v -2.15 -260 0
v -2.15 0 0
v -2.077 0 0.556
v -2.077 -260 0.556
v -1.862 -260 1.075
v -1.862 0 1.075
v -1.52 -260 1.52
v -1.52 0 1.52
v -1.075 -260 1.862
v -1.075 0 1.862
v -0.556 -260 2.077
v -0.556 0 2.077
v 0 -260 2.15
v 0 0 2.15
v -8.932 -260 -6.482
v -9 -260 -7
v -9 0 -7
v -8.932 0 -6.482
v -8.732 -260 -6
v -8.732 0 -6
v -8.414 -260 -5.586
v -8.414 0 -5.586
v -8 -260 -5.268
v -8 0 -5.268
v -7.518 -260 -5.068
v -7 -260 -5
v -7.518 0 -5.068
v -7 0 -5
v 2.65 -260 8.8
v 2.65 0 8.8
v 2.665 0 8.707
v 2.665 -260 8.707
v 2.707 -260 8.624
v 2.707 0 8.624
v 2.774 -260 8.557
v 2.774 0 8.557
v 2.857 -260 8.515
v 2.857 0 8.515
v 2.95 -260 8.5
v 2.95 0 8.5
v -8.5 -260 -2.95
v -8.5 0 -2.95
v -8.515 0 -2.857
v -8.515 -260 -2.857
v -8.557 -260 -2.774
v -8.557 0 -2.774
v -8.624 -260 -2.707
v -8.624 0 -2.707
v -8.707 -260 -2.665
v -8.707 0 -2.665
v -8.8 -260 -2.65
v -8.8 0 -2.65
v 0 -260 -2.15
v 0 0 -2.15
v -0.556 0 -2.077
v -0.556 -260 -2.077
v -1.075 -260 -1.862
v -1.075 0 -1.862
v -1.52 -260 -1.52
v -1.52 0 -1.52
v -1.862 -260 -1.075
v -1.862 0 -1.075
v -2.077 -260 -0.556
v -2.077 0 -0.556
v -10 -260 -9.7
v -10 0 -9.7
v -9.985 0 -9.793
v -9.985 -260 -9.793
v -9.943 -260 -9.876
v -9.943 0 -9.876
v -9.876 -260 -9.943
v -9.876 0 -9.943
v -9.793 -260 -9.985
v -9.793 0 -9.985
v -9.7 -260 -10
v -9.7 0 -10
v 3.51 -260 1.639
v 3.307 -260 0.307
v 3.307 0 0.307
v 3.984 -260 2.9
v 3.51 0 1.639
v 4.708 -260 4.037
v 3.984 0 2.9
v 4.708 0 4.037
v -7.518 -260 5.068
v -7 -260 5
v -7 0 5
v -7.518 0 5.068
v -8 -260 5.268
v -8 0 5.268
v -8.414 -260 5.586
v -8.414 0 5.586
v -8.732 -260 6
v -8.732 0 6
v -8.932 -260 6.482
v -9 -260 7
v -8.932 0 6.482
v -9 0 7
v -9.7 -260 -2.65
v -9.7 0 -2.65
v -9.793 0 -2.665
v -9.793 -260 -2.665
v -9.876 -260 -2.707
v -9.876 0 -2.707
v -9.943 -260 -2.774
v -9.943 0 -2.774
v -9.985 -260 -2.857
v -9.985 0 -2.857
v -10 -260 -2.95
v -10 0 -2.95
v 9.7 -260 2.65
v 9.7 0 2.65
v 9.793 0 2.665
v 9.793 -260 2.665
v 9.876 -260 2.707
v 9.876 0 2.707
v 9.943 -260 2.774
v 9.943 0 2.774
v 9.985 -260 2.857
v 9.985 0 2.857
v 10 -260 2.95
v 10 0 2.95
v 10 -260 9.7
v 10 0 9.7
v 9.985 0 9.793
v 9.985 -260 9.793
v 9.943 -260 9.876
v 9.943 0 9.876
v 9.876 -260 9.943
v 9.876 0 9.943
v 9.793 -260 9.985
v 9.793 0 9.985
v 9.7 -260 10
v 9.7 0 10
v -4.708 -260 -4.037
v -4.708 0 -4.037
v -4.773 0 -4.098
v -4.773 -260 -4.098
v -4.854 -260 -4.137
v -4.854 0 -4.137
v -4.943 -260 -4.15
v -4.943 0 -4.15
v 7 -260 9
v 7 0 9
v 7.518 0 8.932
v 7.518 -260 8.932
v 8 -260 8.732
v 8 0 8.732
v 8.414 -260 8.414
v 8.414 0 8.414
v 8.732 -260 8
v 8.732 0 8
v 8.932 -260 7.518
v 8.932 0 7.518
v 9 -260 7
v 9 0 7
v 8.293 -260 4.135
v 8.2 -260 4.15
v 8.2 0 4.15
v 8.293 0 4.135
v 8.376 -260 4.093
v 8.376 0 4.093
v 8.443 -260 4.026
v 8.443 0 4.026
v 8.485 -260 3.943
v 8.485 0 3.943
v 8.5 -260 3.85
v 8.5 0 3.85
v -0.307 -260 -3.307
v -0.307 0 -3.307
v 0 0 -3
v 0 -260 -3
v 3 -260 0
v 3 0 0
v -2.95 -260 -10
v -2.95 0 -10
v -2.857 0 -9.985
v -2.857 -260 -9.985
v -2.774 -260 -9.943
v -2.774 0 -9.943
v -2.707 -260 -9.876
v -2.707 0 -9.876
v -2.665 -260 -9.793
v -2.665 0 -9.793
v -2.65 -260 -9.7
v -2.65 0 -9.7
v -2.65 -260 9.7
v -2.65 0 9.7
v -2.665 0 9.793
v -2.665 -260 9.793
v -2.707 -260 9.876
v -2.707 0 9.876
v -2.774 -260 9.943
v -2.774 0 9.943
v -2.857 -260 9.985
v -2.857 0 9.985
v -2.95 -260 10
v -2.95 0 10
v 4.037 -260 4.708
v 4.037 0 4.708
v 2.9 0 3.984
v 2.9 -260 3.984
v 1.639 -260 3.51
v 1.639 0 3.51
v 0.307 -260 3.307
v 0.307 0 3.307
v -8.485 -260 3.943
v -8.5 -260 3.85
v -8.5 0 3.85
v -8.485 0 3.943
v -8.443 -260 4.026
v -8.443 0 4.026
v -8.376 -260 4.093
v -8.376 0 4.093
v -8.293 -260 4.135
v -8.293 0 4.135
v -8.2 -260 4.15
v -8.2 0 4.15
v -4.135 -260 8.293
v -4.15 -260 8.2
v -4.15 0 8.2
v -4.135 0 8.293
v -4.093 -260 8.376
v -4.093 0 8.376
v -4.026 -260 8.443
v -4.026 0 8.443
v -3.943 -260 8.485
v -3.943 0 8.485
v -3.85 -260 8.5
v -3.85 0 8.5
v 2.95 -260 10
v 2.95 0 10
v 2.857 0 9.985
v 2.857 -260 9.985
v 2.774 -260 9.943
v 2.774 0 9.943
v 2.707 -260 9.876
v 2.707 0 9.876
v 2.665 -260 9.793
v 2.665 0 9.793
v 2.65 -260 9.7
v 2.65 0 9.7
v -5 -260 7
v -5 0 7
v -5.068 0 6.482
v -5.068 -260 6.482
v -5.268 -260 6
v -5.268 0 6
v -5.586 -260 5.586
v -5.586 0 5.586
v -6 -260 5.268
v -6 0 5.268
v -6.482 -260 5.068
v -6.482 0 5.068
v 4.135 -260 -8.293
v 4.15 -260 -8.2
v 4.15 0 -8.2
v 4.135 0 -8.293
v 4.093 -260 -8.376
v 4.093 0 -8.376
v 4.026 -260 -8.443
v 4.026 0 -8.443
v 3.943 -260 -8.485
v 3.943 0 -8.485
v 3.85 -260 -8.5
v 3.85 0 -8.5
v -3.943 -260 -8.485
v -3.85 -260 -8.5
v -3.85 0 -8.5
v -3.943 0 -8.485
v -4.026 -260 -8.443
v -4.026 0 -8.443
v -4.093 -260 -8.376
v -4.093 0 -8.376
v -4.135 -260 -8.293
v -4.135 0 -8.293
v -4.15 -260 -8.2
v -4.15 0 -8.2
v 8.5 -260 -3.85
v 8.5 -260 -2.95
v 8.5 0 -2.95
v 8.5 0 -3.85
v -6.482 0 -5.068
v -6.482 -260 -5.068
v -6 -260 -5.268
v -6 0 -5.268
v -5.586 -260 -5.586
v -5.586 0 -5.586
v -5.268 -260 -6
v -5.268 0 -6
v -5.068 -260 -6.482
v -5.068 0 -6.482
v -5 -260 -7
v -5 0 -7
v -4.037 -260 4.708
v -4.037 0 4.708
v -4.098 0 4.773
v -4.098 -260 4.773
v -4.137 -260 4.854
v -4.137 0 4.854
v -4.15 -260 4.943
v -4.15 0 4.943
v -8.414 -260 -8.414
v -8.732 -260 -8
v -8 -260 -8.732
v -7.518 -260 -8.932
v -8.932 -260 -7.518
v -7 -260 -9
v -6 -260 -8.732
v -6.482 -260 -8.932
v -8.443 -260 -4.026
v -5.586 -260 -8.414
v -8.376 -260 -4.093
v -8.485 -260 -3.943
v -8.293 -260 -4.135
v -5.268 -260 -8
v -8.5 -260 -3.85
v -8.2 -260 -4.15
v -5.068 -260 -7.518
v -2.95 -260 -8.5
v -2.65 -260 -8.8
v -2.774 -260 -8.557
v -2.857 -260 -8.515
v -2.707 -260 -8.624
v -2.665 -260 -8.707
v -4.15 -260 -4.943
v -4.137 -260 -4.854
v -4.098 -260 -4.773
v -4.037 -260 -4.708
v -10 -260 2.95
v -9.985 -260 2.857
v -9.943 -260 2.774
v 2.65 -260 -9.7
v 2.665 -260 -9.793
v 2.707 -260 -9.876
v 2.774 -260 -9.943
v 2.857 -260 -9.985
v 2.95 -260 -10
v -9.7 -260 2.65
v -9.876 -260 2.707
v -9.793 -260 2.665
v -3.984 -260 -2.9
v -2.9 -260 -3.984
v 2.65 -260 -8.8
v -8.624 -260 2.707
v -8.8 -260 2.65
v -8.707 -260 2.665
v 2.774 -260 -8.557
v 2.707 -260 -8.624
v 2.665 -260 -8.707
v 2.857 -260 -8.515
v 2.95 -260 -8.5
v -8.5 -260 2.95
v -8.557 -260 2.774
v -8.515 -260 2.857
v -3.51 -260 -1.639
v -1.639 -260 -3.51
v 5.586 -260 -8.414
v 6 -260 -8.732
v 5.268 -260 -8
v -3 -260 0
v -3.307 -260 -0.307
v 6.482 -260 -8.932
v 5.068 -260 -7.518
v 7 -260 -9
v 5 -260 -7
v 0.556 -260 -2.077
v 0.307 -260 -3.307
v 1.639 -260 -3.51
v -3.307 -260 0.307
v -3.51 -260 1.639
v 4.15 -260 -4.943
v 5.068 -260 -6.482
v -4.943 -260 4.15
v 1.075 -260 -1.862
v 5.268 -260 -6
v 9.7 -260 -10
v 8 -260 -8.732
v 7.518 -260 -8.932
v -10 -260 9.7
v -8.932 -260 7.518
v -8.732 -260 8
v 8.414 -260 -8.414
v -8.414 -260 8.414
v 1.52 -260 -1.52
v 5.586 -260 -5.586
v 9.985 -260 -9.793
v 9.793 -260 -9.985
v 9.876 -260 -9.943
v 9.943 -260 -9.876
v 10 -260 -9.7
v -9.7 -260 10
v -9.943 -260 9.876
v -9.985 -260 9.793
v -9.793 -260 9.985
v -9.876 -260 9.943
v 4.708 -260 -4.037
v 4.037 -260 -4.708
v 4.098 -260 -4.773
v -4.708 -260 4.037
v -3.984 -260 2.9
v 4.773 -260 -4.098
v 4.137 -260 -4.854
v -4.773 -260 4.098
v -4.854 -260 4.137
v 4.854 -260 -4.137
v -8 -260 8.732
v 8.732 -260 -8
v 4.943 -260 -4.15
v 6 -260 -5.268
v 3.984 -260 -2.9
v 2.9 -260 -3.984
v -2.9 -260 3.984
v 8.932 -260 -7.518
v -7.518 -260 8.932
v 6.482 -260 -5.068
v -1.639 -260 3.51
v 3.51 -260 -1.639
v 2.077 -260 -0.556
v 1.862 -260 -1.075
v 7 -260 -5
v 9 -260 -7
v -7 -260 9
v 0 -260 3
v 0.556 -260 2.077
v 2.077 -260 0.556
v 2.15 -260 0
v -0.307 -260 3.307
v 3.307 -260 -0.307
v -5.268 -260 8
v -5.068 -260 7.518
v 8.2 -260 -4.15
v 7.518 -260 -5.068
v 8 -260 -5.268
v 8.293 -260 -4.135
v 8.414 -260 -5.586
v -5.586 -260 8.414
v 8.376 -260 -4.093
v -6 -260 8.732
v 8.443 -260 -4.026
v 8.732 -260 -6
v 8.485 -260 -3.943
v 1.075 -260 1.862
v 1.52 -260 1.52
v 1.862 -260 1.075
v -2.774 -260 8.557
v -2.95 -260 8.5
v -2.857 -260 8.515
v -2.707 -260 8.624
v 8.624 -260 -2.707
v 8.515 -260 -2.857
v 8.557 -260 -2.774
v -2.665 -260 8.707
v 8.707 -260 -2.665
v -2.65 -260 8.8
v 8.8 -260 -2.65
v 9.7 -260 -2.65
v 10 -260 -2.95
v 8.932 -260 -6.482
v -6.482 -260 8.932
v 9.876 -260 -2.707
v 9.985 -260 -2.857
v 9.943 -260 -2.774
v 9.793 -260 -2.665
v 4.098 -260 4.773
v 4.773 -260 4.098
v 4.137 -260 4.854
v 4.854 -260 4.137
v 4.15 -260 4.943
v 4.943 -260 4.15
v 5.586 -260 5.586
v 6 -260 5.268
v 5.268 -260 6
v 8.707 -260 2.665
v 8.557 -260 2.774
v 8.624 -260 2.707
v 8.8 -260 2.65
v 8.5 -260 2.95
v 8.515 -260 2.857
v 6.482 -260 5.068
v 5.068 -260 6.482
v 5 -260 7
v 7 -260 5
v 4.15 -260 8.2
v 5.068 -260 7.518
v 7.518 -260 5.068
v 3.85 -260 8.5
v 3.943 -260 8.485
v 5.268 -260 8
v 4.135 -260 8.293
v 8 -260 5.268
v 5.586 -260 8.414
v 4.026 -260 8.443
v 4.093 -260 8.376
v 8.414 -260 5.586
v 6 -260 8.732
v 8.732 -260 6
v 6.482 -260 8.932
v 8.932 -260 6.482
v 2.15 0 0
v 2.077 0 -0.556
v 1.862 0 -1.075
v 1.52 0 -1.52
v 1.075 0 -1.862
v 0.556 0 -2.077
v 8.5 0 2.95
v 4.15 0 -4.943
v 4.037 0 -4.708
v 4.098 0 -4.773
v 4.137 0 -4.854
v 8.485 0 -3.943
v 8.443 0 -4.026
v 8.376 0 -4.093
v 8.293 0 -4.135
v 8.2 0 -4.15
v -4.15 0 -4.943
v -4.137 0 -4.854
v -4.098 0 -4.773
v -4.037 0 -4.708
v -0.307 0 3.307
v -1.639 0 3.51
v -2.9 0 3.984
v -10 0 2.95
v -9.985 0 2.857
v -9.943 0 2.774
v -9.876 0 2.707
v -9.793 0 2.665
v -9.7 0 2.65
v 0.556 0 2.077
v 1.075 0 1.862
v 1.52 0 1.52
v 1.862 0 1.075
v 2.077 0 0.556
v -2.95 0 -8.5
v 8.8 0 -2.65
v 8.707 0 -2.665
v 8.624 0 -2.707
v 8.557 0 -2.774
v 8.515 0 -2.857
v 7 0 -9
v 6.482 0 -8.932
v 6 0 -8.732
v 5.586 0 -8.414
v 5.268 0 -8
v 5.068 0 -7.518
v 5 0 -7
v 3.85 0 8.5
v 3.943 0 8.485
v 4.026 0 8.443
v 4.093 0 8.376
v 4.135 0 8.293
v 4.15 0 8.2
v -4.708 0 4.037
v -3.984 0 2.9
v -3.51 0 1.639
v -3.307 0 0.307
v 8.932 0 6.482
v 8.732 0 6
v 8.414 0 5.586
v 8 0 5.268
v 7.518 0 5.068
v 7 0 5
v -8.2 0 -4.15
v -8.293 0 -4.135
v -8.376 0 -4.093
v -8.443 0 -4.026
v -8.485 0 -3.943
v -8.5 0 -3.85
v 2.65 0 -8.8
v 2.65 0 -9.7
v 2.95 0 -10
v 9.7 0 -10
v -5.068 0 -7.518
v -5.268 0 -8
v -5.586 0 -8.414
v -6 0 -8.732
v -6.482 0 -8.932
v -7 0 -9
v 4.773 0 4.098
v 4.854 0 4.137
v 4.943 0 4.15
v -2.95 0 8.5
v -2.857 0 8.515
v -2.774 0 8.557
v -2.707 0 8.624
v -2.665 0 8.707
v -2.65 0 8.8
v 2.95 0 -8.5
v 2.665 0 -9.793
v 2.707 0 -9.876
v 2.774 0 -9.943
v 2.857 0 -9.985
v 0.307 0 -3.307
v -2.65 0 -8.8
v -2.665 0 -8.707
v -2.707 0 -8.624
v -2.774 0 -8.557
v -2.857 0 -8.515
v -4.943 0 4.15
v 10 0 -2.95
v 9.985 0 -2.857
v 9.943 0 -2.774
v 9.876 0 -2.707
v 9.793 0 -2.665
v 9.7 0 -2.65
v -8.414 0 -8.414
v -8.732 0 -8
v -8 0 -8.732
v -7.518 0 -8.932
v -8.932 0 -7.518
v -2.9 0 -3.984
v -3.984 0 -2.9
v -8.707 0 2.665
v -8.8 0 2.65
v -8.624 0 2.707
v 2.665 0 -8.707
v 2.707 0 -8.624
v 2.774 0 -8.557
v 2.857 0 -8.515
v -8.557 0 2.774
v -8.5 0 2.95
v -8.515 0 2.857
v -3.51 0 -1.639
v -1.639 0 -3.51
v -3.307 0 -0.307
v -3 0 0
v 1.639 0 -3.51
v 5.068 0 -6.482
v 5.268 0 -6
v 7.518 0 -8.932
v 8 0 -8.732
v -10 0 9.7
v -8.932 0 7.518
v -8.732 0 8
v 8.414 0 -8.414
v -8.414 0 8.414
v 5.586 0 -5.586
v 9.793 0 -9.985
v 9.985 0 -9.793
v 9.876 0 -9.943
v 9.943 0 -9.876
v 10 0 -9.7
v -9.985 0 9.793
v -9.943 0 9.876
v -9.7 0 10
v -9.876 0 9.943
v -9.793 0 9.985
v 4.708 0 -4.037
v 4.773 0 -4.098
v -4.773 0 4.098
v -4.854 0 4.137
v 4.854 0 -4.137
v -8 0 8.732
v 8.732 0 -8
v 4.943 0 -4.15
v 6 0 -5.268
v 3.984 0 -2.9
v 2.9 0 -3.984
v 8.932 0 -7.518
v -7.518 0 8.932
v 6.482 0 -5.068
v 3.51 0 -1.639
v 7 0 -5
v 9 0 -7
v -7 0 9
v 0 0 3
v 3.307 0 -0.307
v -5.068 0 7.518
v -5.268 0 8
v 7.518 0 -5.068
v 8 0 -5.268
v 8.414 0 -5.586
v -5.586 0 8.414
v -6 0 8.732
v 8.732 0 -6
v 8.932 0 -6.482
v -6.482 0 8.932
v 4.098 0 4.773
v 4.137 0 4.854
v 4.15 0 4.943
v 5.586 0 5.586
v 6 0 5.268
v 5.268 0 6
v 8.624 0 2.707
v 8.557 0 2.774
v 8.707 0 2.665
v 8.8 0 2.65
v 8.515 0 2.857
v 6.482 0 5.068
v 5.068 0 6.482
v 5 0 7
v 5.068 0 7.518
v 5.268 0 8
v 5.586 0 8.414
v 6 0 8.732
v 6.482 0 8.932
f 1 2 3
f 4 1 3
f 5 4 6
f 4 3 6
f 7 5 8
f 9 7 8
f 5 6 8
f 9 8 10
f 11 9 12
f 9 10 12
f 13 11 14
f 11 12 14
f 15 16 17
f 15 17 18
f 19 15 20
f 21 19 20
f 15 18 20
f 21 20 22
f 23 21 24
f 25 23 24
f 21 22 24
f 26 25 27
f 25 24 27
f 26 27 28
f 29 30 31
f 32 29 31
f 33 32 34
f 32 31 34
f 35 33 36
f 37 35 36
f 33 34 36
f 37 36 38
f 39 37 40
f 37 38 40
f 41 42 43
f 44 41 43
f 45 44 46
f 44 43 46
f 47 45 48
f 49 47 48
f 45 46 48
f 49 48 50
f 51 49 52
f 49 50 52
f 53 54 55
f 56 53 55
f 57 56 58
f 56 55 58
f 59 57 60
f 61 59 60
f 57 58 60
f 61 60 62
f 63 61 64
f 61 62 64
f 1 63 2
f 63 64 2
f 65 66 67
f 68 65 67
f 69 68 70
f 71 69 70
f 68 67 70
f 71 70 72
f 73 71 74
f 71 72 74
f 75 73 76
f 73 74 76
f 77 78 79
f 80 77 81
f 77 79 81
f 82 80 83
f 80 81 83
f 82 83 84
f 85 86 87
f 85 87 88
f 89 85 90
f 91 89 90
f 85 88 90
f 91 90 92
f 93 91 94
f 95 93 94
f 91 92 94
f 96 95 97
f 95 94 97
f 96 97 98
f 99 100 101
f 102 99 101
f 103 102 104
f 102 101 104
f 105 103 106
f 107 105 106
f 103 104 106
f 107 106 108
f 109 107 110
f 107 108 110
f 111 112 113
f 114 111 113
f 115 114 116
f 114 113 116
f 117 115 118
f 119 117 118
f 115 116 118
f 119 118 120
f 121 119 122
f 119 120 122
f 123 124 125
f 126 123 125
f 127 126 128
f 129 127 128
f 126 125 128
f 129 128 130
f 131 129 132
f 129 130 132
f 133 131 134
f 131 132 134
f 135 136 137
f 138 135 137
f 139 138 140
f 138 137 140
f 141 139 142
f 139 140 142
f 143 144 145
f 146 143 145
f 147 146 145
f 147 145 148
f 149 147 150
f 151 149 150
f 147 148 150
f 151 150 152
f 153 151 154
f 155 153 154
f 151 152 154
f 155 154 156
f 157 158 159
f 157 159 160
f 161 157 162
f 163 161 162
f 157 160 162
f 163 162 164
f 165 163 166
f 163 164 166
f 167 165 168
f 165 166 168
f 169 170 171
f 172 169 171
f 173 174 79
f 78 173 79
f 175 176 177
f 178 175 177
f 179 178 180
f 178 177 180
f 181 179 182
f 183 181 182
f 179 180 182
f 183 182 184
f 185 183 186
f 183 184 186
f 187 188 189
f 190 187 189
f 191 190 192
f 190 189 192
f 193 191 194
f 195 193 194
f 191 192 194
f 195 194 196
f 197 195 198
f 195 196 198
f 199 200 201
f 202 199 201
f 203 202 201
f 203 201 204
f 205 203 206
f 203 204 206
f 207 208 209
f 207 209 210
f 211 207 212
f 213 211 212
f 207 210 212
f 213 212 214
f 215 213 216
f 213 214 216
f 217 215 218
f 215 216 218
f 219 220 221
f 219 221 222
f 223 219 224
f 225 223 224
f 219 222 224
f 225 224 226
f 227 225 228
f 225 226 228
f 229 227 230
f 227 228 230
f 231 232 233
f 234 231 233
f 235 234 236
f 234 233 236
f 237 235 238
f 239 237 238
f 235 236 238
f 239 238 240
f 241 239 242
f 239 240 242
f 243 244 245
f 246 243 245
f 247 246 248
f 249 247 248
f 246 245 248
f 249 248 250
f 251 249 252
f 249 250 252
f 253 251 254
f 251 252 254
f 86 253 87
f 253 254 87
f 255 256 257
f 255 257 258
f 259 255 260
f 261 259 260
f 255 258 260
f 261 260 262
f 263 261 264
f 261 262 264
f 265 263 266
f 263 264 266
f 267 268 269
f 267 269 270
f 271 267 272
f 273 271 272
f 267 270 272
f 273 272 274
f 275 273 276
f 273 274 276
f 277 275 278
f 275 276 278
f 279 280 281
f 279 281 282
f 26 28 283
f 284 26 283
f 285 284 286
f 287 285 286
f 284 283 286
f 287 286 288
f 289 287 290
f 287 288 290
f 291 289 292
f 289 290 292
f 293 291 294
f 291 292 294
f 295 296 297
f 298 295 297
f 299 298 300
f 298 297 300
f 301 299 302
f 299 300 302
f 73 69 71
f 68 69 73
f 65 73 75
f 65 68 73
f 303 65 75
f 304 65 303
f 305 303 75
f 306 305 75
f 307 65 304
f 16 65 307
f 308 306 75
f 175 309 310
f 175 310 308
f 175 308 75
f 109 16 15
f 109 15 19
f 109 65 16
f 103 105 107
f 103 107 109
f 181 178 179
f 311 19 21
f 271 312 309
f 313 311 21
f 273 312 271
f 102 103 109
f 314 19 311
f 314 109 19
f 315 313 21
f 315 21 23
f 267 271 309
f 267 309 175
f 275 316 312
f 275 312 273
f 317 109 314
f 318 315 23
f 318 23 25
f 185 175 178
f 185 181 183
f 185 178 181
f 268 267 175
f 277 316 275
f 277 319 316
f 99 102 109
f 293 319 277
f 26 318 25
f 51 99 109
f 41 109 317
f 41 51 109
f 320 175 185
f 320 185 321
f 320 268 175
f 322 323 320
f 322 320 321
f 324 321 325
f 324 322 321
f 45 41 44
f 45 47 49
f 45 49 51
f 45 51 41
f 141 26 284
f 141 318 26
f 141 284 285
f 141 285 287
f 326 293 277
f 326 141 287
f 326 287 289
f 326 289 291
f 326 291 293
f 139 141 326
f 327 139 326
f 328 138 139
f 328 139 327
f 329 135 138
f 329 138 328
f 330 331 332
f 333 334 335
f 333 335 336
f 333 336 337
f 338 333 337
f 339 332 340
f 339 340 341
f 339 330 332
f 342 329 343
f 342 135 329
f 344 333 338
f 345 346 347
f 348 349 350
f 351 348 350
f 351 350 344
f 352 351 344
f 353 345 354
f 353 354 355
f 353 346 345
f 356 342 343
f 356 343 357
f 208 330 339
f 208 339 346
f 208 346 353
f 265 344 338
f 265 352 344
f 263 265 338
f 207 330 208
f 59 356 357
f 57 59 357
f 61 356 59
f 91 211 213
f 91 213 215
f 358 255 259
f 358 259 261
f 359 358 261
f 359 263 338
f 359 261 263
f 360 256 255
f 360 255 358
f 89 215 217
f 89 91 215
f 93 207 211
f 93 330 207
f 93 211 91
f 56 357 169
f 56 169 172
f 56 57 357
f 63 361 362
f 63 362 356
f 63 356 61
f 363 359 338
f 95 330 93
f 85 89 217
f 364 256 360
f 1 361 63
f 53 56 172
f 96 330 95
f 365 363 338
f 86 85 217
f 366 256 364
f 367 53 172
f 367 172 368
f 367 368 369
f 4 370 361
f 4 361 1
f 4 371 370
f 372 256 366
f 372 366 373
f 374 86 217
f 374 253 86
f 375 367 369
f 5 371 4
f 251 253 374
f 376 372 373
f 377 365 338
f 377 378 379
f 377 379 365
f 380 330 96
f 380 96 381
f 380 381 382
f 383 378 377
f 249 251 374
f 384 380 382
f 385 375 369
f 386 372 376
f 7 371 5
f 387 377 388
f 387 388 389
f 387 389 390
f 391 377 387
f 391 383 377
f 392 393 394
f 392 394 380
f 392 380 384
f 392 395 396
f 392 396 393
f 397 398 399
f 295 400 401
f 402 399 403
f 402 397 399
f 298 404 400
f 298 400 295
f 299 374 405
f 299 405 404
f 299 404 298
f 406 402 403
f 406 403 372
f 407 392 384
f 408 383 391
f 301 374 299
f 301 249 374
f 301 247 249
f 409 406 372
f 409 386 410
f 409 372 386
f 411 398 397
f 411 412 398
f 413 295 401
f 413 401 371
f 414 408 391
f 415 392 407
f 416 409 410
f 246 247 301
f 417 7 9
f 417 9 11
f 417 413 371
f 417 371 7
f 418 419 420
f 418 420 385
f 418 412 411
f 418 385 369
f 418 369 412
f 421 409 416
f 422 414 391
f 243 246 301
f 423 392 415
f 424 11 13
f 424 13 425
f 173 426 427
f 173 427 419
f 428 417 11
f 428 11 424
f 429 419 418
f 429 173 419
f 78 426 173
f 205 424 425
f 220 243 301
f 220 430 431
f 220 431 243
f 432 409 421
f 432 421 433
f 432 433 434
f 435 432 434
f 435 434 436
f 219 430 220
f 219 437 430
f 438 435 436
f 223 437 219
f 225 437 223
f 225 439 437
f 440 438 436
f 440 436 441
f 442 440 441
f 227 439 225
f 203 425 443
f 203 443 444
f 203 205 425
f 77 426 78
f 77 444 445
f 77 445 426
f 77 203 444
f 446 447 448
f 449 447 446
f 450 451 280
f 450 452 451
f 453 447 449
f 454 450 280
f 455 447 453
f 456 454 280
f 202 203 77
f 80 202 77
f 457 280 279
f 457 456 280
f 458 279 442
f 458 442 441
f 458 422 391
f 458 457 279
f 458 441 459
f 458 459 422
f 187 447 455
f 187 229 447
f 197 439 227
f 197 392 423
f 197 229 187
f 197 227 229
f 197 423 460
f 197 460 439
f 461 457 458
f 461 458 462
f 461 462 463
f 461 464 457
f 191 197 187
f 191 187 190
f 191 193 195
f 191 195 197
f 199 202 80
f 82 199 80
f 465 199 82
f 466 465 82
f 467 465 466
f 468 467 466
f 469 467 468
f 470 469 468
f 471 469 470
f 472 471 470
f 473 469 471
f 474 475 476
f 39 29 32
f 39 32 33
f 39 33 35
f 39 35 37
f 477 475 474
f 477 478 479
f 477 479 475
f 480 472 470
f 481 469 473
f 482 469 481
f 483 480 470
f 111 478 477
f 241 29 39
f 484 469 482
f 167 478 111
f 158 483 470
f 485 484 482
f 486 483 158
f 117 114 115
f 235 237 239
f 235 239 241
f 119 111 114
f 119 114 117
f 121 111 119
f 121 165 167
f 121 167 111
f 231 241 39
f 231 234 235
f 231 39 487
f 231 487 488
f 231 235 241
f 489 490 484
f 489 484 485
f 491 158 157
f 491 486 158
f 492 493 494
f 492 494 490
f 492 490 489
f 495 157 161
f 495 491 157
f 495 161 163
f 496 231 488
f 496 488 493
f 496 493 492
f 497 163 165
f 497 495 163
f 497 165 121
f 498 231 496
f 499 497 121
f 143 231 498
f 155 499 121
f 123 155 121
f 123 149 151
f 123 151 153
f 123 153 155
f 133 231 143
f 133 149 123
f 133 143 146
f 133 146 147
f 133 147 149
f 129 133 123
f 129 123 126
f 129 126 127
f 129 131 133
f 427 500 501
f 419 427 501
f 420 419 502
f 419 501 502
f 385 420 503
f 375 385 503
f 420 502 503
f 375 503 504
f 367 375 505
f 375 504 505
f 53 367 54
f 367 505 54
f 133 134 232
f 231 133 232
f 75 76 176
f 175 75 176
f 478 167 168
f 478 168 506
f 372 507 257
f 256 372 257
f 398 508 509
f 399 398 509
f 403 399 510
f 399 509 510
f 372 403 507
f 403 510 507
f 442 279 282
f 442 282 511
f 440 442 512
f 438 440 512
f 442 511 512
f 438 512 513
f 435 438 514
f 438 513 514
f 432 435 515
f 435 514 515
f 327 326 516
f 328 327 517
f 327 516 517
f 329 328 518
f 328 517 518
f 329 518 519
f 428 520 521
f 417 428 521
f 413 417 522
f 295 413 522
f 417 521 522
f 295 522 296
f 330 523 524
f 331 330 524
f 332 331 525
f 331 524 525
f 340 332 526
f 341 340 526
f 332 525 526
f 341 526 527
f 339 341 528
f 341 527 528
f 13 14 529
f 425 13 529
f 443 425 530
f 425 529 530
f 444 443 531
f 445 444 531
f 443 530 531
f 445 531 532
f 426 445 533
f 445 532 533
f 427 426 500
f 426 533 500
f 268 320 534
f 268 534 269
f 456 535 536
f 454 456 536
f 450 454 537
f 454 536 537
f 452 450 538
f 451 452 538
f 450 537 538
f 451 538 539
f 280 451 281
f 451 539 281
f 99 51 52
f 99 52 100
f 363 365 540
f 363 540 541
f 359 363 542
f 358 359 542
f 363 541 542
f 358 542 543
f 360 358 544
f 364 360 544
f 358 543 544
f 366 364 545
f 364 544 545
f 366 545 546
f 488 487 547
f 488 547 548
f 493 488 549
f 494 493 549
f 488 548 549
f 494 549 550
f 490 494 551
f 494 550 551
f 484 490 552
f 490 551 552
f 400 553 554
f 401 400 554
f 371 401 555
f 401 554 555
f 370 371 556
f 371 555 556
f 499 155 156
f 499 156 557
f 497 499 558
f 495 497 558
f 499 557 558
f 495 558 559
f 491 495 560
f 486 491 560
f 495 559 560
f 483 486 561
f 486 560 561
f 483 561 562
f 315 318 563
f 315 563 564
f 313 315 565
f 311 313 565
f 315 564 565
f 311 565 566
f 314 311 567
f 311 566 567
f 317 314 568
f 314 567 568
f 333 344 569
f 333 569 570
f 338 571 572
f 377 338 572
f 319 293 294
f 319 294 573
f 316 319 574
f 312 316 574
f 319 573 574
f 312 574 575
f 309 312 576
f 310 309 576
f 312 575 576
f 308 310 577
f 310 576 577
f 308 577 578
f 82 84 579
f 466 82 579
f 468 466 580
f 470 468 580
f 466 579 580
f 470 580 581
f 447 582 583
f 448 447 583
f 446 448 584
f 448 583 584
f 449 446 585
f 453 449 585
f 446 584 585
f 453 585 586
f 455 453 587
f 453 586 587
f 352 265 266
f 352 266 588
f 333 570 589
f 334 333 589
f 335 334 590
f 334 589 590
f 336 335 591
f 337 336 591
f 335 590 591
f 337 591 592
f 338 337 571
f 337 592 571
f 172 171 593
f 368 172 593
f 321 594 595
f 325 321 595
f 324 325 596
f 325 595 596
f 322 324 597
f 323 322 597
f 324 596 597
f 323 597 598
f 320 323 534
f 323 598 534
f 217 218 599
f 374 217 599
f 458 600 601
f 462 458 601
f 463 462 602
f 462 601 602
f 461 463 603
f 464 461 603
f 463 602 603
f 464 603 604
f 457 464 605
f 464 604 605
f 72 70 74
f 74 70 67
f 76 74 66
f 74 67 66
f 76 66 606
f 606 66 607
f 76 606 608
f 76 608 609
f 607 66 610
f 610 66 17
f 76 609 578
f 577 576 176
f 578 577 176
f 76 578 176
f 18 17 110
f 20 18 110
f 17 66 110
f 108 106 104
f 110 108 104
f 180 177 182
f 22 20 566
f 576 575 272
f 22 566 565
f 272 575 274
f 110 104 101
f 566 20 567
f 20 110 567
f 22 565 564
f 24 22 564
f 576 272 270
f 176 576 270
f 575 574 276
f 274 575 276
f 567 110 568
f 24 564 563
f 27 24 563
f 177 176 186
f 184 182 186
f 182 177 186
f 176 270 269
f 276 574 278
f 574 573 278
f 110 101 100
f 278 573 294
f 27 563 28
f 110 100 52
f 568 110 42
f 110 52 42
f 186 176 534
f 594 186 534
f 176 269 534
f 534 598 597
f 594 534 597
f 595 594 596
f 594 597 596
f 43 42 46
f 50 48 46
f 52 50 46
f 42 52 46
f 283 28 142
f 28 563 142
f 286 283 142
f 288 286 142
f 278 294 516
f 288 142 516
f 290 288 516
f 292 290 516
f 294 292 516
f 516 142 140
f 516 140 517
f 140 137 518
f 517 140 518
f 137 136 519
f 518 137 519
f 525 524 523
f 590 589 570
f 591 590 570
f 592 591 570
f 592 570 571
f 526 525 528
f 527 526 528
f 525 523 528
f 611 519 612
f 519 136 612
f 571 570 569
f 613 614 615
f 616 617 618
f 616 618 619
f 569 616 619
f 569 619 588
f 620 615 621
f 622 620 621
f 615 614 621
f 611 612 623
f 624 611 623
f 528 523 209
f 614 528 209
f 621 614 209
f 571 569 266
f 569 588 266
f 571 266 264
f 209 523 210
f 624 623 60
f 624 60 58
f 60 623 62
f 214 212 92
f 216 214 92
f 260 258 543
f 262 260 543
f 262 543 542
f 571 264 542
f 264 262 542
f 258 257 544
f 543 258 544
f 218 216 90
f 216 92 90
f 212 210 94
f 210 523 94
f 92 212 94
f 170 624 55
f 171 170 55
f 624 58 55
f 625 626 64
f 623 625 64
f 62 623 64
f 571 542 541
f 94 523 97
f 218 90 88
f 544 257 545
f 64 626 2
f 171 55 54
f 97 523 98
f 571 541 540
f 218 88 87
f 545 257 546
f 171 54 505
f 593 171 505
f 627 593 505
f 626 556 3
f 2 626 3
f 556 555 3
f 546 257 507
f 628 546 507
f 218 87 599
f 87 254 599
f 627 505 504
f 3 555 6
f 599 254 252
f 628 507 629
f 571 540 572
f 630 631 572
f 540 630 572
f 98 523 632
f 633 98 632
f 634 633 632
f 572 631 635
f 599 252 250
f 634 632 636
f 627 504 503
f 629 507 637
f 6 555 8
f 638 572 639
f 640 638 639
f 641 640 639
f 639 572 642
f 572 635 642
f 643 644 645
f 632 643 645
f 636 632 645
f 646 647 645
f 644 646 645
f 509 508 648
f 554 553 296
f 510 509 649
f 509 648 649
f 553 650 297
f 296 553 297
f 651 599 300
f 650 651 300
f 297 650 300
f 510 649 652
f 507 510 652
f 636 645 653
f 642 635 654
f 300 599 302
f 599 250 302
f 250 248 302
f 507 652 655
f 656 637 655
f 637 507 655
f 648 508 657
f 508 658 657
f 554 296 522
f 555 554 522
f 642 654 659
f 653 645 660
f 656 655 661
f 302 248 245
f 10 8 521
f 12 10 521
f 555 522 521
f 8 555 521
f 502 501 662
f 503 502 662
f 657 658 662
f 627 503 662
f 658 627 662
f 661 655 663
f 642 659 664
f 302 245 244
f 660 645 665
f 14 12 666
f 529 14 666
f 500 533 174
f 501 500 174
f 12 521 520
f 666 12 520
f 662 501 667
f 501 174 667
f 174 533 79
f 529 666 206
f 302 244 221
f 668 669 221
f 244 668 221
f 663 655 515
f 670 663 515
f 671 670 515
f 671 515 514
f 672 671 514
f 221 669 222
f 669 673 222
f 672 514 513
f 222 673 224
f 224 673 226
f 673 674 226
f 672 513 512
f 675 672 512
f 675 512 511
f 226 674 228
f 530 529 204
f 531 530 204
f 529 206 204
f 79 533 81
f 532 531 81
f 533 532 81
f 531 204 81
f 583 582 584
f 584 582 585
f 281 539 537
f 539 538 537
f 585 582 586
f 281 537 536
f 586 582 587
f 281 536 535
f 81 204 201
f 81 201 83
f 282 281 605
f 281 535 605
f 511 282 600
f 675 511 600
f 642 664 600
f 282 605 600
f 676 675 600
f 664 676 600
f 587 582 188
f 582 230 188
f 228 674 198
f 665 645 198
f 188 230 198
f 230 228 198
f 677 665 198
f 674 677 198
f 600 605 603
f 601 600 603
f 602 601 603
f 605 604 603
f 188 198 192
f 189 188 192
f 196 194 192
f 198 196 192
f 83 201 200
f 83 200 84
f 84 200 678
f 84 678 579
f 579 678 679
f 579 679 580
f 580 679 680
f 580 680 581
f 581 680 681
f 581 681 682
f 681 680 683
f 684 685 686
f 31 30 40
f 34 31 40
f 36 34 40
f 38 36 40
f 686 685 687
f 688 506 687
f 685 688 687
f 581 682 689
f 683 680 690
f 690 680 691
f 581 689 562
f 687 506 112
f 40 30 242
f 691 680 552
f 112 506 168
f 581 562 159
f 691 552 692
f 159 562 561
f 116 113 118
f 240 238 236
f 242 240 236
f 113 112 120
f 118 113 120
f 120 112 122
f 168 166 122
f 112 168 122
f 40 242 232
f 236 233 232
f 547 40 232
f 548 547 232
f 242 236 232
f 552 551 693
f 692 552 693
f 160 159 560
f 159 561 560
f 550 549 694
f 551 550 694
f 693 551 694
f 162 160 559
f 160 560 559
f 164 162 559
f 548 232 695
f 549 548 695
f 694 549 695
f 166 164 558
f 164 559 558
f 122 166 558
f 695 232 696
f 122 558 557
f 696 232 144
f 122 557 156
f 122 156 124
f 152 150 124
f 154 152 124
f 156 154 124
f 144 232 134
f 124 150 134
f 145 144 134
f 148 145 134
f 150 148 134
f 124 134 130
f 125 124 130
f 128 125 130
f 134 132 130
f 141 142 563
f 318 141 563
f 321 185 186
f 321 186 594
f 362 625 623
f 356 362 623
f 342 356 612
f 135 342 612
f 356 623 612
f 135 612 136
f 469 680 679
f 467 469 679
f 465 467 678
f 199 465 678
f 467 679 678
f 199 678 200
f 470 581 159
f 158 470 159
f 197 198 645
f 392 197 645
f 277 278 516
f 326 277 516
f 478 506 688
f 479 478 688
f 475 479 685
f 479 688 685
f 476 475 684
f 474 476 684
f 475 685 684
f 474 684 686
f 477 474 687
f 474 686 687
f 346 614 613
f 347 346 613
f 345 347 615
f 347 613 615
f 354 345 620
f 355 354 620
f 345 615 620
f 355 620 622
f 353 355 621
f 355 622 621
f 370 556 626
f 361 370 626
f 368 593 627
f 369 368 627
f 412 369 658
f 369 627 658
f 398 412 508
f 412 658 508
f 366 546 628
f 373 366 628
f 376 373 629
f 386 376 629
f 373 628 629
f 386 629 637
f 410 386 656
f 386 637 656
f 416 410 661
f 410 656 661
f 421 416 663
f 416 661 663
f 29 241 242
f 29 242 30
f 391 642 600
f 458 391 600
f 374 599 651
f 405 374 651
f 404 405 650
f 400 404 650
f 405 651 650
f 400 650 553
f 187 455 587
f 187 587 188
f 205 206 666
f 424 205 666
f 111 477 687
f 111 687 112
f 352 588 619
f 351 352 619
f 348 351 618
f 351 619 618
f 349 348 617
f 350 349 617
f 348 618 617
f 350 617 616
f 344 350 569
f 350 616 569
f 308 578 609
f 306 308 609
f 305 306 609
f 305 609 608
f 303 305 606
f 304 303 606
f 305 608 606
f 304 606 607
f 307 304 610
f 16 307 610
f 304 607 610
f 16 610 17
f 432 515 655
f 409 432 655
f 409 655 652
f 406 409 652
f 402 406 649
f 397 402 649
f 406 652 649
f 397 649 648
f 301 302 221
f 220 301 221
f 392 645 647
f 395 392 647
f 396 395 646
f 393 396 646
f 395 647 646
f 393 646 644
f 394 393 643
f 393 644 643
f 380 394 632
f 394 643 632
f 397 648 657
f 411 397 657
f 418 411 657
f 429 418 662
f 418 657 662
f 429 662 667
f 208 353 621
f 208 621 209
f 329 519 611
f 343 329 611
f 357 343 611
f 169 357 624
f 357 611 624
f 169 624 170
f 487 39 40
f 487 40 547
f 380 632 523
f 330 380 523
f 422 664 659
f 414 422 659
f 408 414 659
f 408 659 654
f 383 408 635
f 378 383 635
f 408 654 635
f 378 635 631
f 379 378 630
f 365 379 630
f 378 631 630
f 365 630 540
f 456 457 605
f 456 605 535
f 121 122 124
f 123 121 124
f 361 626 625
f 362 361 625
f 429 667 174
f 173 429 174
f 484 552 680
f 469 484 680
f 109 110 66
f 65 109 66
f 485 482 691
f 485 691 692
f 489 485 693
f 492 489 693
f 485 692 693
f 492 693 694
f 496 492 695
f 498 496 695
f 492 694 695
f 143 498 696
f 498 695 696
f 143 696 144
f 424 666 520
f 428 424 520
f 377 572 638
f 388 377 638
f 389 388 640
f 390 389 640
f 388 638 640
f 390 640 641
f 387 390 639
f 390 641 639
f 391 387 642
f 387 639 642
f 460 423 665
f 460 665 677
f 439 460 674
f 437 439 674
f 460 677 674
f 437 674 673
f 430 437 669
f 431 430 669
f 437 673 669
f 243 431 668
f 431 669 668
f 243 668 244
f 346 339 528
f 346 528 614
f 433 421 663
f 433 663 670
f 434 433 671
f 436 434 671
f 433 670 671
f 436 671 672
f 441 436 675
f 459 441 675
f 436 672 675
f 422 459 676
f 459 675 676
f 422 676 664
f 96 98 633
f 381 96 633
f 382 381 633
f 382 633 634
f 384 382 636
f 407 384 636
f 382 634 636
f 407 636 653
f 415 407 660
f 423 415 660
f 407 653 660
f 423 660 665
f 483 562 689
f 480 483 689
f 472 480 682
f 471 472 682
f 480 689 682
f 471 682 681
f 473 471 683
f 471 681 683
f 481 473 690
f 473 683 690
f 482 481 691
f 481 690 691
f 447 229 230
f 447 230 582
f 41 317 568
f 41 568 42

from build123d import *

# Parameters (mm, degrees)
F1_DEPTH = 260


# Not quite as in the source:
# - ends of sketch curves that miss each other by under 0.0002 mm in the source are joined


with BuildPart() as f1:
    # F0 (on Front) → F1 (new body)
    with BuildSketch(Plane.XZ):
        with BuildLine():
            ThreePointArc((-2.15, 0), (-1.5202795796, 1.5202795796), (0, 2.15))
            Line((0, 2.15), (0, 3))
            Line((0, 3), (-0.307277, 3.307278))
            ThreePointArc((-0.307277, 3.307278), (-2.2820211583, 3.7143800615), (-4.036565823, 4.7078182229))
            ThreePointArc((-4.036565823, 4.7078182229), (-4.1201572004, 4.8123081084), (-4.15, 4.94275))
            Line((-4.15, 4.94275), (-4.15, 8.2))
            ThreePointArc((-4.15, 8.2), (-4.0621320344, 8.4121320344), (-3.85, 8.5))
            Line((-3.85, 8.5), (-2.95, 8.5))
            ThreePointArc((-2.95, 8.5), (-2.7378679656, 8.5878679656), (-2.65, 8.8))
            Line((-2.65, 8.8), (-2.65, 9.7))
            ThreePointArc((-2.65, 9.7), (-2.7378679656, 9.9121320344), (-2.95, 10))
            Line((-2.95, 10), (-9.7, 10))
            ThreePointArc((-9.7, 10), (-9.9121320344, 9.9121320344), (-10, 9.7))
            Line((-10, 9.7), (-10, 2.95))
            ThreePointArc((-10, 2.95), (-9.9121320344, 2.7378679656), (-9.7, 2.65))
            Line((-9.7, 2.65), (-8.8, 2.65))
            ThreePointArc((-8.8, 2.65), (-8.5878679656, 2.7378679656), (-8.5, 2.95))
            Line((-8.5, 2.95), (-8.5, 3.85))
            ThreePointArc((-8.5, 3.85), (-8.4121320344, 4.0621320344), (-8.2, 4.15))
            Line((-8.2, 4.15), (-4.942749, 4.15))
            ThreePointArc((-4.942749, 4.15), (-4.812307461, 4.1201573706), (-4.7078173786, 4.0365666993))
            ThreePointArc((-4.7078173786, 4.0365666993), (-3.7143793747, 2.2820219924), (-3.3072773955, 0.3072779813))
            Line((-3.3072773955, 0.3072779813), (-3, 0))
            Line((-3, 0), (-2.15, 0))
        make_face()
        with BuildLine():
            ThreePointArc((-7, 5), (-8.4142135624, 5.5857864376), (-9, 7))
            ThreePointArc((-9, 7), (-8.4142135624, 8.4142135624), (-7, 9))
            ThreePointArc((-7, 9), (-5.5857864376, 8.4142135624), (-5, 7))
            ThreePointArc((-5, 7), (-5.5857864376, 5.5857864376), (-7, 5))
        make_face(mode=Mode.SUBTRACT)
        with BuildLine():
            ThreePointArc((0, 2.15), (1.5202795796, 1.5202795796), (2.15, 0))
            Line((2.15, 0), (3, 0))
            Line((3, 0), (3.307278, 0.307278))
            ThreePointArc((3.307278, 0.307278), (3.7143803747, 2.2820219924), (4.7078187099, 4.0365664363))
            ThreePointArc((4.7078187099, 4.0365664363), (4.812308461, 4.1201573706), (4.94275, 4.15))
            Line((4.94275, 4.15), (8.2, 4.15))
            ThreePointArc((8.2, 4.15), (8.4121320344, 4.0621320344), (8.5, 3.85))
            Line((8.5, 3.85), (8.5, 2.95))
            ThreePointArc((8.5, 2.95), (8.5878679656, 2.7378679656), (8.8, 2.65))
            Line((8.8, 2.65), (9.7, 2.65))
            ThreePointArc((9.7, 2.65), (9.9121320344, 2.7378679656), (10, 2.95))
            Line((10, 2.95), (10, 9.7))
            ThreePointArc((10, 9.7), (9.9121320344, 9.9121320344), (9.7, 10))
            Line((9.7, 10), (2.95, 10))
            ThreePointArc((2.95, 10), (2.7378679656, 9.9121320344), (2.65, 9.7))
            Line((2.65, 9.7), (2.65, 8.8))
            ThreePointArc((2.65, 8.8), (2.7378679656, 8.5878679656), (2.95, 8.5))
            Line((2.95, 8.5), (3.85, 8.5))
            ThreePointArc((3.85, 8.5), (4.0621320344, 8.4121320344), (4.15, 8.2))
            Line((4.15, 8.2), (4.15, 4.94275))
            ThreePointArc((4.15, 4.94275), (4.1201572004, 4.8123081084), (4.036566086, 4.7078178916))
            ThreePointArc((4.036566086, 4.7078178916), (2.2820216259, 3.7143802371), (0.3072779813, 3.3072783955))
            Line((0.3072779813, 3.3072783955), (0, 3))
            Line((0, 3), (0, 2.15))
        make_face()
        with BuildLine():
            ThreePointArc((7, 9), (8.4142135624, 8.4142135624), (9, 7))
            ThreePointArc((9, 7), (8.4142135624, 5.5857864376), (7, 5))
            ThreePointArc((7, 5), (5.5857864376, 5.5857864376), (5, 7))
            ThreePointArc((5, 7), (5.5857864376, 8.4142135624), (7, 9))
        make_face(mode=Mode.SUBTRACT)
        with BuildLine():
            Line((3, 0), (2.15, 0))
            ThreePointArc((2.15, 0), (1.5202795796, -1.5202795796), (0, -2.15))
            Line((0, -2.15), (0, -3))
            Line((0, -3), (0.307278, -3.307277))
            ThreePointArc((0.307278, -3.307277), (2.2820216259, -3.7143792371), (4.036565823, -4.7078172229))
            ThreePointArc((4.036565823, -4.7078172229), (4.1201572004, -4.8123071084), (4.15, -4.942749))
            Line((4.15, -4.942749), (4.15, -8.2))
            ThreePointArc((4.15, -8.2), (4.0621320344, -8.4121320344), (3.85, -8.5))
            Line((3.85, -8.5), (2.95, -8.5))
            ThreePointArc((2.95, -8.5), (2.7378679656, -8.5878679656), (2.65, -8.8))
            Line((2.65, -8.8), (2.65, -9.7))
            ThreePointArc((2.65, -9.7), (2.7378679656, -9.9121320344), (2.95, -10))
            Line((2.95, -10), (9.7, -10))
            ThreePointArc((9.7, -10), (9.9121320344, -9.9121320344), (10, -9.7))
            Line((10, -9.7), (10, -2.95))
            ThreePointArc((10, -2.95), (9.9121320344, -2.7378679656), (9.7, -2.65))
            Line((9.7, -2.65), (8.8, -2.65))
            ThreePointArc((8.8, -2.65), (8.5878679656, -2.7378679656), (8.5, -2.95))
            Line((8.5, -2.95), (8.5, -3.85))
            ThreePointArc((8.5, -3.85), (8.4121320344, -4.0621320344), (8.2, -4.15))
            Line((8.2, -4.15), (4.94275, -4.15))
            ThreePointArc((4.94275, -4.15), (4.8123081084, -4.1201572004), (4.7078178916, -4.036566086))
            ThreePointArc((4.7078178916, -4.036566086), (3.7143800615, -2.2820211583), (3.3072783483, -0.3072769835))
            Line((3.3072783483, -0.3072769835), (3, 0))
        make_face()
        with BuildLine():
            ThreePointArc((7, -5), (8.4142135624, -5.5857864376), (9, -7))
            ThreePointArc((9, -7), (8.4142135624, -8.4142135624), (7, -9))
            ThreePointArc((7, -9), (5.5857864376, -8.4142135624), (5, -7))
            ThreePointArc((5, -7), (5.5857864376, -5.5857864376), (7, -5))
        make_face(mode=Mode.SUBTRACT)
        with BuildLine():
            Line((0, -3), (0, -2.15))
            ThreePointArc((0, -2.15), (-1.5202795796, -1.5202795796), (-2.15, 0))
            Line((-2.15, 0), (-3, 0))
            Line((-3, 0), (-3.307277, -0.307277))
            ThreePointArc((-3.307277, -0.307277), (-3.7143790615, -2.2820211583), (-4.7078172229, -4.036565823))
            ThreePointArc((-4.7078172229, -4.036565823), (-4.8123071084, -4.1201572004), (-4.942749, -4.15))
            Line((-4.942749, -4.15), (-8.2, -4.15))
            ThreePointArc((-8.2, -4.15), (-8.4121320344, -4.0621320344), (-8.5, -3.85))
            Line((-8.5, -3.85), (-8.5, -2.95))
            ThreePointArc((-8.5, -2.95), (-8.5878679656, -2.7378679656), (-8.8, -2.65))
            Line((-8.8, -2.65), (-9.7, -2.65))
            ThreePointArc((-9.7, -2.65), (-9.9121320344, -2.7378679656), (-10, -2.95))
            Line((-10, -2.95), (-10, -9.7))
            ThreePointArc((-10, -9.7), (-9.9121320344, -9.9121320344), (-9.7, -10))
            Line((-9.7, -10), (-2.95, -10))
            ThreePointArc((-2.95, -10), (-2.7378679656, -9.9121320344), (-2.65, -9.7))
            Line((-2.65, -9.7), (-2.65, -8.8))
            ThreePointArc((-2.65, -8.8), (-2.7378679656, -8.5878679656), (-2.95, -8.5))
            Line((-2.95, -8.5), (-3.85, -8.5))
            ThreePointArc((-3.85, -8.5), (-4.0621320344, -8.4121320344), (-4.15, -8.2))
            Line((-4.15, -8.2), (-4.15, -4.942749))
            ThreePointArc((-4.15, -4.942749), (-4.1201572004, -4.8123071084), (-4.036566086, -4.7078168916))
            ThreePointArc((-4.036566086, -4.7078168916), (-2.2820211583, -3.7143790615), (-0.3072769835, -3.3072773483))
            Line((-0.3072769835, -3.3072773483), (0, -3))
        make_face()
        with BuildLine():
            ThreePointArc((-7, -9), (-8.4142135624, -8.4142135624), (-9, -7))
            ThreePointArc((-9, -7), (-8.4142135624, -5.5857864376), (-7, -5))
            ThreePointArc((-7, -5), (-5.5857864376, -5.5857864376), (-5, -7))
            ThreePointArc((-5, -7), (-5.5857864376, -8.4142135624), (-7, -9))
        make_face(mode=Mode.SUBTRACT)
    extrude(amount=F1_DEPTH)


solid = f1.part
